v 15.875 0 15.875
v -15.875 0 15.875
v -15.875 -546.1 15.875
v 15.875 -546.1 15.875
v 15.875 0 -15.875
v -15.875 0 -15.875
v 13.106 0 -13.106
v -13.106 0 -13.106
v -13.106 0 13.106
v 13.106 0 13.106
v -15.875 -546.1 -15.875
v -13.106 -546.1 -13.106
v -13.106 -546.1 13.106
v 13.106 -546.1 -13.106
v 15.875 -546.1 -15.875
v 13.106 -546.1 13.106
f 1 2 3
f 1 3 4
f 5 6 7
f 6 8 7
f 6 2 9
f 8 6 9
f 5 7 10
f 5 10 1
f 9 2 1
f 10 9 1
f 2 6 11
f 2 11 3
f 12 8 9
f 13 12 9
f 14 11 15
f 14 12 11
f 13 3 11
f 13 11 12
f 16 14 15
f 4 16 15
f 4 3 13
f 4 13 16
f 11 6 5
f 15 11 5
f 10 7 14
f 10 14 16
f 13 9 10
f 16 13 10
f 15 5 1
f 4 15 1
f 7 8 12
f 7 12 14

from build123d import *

# Parameters (mm, degrees)
SKETCH_W   = 31.75
SKETCH_H   = 31.75
SKETCH_W_2 = 26.2128
SKETCH_H_2 = 26.2128
PAD_DEPTH  = 546.1


with BuildPart() as part:
    # Sketch → Pad (new body)
    with BuildSketch(Plane.XZ):
        Rectangle(SKETCH_W, SKETCH_H)
        Rectangle(SKETCH_W_2, SKETCH_H_2, mode=Mode.SUBTRACT)
    extrude(amount=PAD_DEPTH)


solid = part.part
